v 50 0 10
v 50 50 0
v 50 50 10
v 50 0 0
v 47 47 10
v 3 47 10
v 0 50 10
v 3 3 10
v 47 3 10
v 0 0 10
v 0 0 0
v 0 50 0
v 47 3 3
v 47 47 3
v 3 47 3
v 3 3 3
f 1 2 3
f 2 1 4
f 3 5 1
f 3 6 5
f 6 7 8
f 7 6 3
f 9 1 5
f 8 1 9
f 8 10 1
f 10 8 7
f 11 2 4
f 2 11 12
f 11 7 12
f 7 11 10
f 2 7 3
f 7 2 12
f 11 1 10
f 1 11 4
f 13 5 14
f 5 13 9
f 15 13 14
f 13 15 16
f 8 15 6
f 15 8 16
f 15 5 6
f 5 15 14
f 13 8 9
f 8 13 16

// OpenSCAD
// Generated by HEIDI for job job_1787723074504_59f8641b
// Product: 3D-Printable Model Preparation Package
// Request: E2E production path qualification test — automated cleanup expected
// Model type: box
// Generated: 2026-09-07T04:35:14.971Z
//
// This is a parameterized OpenSCAD model. You can adjust the
// parameters below to customize the dimensions before rendering.

// ─── Parameters ───
width = 50;       // X dimension in mm
height = 50;     // Y dimension in mm
depth = 10;       // Z dimension in mm
wall = 3;    // wall thickness in mm
$fn = 60;               // facet resolution

// Parametric hollow box
module parametric_box() {
    difference() {
        // Outer shell
        cube([width, height, depth]);
        // Inner cavity
        translate([wall, wall, wall])
            cube([width - wall * 2, height - wall * 2, depth - wall + 1]);
    }
}
parametric_box();
